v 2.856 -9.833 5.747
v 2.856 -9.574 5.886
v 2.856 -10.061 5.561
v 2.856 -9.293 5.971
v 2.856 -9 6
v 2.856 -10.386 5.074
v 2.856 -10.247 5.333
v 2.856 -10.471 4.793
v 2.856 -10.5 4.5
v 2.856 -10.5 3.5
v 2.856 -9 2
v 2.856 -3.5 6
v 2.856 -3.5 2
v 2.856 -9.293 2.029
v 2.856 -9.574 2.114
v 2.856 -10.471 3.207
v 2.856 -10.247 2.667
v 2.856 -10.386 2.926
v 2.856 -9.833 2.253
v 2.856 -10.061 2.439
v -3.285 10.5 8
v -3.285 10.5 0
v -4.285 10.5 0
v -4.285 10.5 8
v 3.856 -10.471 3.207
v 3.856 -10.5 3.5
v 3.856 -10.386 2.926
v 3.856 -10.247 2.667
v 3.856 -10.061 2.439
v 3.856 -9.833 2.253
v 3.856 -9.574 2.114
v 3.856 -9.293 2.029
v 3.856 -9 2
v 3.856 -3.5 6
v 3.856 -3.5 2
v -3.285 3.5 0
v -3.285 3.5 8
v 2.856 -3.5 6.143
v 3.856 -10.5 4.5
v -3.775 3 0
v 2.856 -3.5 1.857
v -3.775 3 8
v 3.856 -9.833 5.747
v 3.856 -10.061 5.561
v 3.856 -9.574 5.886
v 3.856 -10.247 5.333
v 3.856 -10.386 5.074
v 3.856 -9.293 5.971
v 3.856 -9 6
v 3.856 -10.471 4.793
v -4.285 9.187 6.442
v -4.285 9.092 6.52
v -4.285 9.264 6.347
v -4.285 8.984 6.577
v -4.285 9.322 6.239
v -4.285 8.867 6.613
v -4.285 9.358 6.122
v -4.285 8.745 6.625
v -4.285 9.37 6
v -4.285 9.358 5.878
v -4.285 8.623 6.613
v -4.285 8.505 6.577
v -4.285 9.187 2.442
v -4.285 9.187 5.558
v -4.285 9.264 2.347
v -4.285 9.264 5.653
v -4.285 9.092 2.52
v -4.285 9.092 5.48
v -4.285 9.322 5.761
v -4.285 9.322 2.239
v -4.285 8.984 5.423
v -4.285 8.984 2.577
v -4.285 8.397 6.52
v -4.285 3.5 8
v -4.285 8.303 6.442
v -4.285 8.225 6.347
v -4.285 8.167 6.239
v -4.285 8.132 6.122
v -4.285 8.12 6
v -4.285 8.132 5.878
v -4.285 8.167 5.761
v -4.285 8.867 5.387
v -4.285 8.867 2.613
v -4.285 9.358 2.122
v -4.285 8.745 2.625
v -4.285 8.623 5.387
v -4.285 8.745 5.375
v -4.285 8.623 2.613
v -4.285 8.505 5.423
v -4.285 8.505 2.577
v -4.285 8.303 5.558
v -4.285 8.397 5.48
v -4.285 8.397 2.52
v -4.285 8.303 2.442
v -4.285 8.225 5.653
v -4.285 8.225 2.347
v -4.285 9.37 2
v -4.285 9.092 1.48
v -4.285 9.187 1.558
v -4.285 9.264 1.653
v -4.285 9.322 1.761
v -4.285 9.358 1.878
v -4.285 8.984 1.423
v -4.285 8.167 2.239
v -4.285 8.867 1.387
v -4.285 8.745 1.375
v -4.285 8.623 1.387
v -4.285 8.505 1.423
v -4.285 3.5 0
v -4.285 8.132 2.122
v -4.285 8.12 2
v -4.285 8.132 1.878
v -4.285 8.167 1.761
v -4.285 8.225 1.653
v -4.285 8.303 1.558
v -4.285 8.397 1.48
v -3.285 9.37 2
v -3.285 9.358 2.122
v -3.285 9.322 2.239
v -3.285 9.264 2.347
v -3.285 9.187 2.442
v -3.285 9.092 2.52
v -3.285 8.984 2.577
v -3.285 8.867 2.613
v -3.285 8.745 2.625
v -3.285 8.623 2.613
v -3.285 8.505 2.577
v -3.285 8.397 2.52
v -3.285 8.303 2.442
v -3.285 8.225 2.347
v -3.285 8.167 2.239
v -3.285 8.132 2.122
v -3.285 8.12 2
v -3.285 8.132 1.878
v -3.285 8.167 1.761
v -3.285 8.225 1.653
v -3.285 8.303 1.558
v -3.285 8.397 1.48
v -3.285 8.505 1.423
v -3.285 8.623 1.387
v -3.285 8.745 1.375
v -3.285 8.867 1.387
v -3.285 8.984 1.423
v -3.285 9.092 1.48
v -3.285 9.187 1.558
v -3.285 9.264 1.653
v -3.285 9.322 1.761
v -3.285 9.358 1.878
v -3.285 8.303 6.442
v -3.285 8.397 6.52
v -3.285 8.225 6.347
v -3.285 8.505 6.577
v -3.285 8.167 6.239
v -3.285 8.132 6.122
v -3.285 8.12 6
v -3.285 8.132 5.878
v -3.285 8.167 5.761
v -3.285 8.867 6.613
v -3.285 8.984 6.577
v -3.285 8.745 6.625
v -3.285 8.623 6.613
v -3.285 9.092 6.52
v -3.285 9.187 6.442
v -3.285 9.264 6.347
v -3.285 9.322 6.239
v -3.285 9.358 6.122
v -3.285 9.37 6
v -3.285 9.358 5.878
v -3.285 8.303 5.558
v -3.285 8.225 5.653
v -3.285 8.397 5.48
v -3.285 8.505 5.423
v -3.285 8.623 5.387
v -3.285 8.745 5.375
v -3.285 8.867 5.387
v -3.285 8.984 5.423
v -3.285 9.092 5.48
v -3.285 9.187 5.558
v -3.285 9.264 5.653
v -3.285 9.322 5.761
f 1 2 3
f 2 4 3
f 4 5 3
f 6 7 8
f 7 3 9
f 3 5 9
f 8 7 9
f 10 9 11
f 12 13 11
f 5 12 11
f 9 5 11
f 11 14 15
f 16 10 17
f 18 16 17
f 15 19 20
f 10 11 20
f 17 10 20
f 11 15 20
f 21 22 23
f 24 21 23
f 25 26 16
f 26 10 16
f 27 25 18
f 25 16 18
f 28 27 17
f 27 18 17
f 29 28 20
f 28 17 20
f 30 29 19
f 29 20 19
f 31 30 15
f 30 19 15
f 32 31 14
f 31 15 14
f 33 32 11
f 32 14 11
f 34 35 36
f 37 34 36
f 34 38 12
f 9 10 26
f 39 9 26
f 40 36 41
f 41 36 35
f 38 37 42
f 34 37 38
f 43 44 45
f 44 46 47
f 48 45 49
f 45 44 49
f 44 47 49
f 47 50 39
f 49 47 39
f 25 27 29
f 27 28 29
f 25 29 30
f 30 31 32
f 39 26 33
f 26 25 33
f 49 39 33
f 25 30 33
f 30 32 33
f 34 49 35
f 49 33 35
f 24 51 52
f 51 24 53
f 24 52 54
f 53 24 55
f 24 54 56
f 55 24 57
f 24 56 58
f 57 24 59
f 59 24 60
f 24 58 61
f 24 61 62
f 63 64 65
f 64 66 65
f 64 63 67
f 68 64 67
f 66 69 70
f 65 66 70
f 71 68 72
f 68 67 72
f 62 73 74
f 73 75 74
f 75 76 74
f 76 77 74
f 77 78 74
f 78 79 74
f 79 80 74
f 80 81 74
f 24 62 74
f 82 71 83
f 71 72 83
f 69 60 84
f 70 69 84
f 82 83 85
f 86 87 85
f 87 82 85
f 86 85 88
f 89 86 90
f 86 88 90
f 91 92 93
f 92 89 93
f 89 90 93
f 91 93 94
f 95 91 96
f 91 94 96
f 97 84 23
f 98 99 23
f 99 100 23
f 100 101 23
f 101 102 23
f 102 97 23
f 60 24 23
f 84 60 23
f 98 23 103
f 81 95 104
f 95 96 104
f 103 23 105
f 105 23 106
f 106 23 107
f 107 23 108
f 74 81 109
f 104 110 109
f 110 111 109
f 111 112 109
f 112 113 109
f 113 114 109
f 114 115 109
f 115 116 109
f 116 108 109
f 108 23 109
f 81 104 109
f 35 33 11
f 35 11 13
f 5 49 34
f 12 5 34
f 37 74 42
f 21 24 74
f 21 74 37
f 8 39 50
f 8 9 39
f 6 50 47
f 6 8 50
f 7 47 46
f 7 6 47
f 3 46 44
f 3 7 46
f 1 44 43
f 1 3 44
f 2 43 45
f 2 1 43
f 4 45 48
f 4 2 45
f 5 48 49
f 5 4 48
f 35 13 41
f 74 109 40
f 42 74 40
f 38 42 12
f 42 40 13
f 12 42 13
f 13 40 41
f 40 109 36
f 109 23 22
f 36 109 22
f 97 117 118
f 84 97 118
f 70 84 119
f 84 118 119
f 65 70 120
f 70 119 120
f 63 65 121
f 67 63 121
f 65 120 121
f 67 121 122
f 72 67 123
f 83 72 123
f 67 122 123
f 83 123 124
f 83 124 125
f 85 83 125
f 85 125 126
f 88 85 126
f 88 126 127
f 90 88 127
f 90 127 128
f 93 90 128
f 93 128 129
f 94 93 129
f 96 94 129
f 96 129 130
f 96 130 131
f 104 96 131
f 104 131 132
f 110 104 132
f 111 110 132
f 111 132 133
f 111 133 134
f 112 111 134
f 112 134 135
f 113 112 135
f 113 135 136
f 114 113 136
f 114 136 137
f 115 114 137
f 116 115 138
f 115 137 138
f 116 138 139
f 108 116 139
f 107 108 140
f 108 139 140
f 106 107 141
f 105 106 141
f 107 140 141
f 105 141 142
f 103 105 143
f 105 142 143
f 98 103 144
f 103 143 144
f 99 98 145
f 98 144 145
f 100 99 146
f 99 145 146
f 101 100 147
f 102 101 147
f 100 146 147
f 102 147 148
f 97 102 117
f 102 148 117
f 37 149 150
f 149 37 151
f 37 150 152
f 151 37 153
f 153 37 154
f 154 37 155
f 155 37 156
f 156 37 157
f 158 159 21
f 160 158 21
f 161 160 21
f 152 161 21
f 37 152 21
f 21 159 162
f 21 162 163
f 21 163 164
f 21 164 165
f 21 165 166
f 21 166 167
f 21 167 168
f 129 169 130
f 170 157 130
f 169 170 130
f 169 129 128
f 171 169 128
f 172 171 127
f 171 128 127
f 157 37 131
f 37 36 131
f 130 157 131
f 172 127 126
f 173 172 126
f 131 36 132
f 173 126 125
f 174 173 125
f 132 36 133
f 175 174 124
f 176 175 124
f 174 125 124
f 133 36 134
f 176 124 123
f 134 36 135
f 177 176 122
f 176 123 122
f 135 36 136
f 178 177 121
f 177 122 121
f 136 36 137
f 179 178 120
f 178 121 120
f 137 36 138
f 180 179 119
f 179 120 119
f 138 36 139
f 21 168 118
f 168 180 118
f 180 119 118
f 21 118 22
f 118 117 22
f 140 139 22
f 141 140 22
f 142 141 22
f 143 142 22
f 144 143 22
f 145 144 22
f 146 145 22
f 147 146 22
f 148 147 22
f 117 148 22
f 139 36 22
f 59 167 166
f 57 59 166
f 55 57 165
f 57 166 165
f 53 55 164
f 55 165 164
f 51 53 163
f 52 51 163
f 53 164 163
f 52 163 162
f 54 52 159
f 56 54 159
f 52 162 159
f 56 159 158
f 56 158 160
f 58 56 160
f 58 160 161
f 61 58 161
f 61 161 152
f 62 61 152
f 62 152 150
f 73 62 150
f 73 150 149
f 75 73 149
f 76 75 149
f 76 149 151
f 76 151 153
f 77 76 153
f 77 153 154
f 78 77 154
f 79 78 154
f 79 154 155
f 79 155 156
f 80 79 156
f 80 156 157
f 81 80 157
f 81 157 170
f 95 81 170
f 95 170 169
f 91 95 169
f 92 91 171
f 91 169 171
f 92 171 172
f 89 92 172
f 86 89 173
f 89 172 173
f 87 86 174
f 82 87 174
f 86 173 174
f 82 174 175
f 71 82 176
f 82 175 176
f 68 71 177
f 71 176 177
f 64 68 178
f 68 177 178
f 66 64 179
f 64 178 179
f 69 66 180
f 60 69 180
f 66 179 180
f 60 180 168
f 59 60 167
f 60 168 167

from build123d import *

# Parameters (mm, degrees)
BOSS_EXTRU_1_DEPTH      = 8
ESQUISSE2_R             = 0.625
ENL_V_MAT_EXTRU_2_DEPTH = 8
ENL_V_MAT_EXTRU_4_DEPTH = 8
ESQUISSE4_W             = 2
ESQUISSE4_H             = 7
ENL_V_MAT_EXTRU_6_DEPTH = 8
CONG_4_R                = 1.5
CONG_7_R                = 1.5


with BuildPart() as part:
    # Esquisse1 → Boss.-Extru.1 (new body)
    with BuildSketch(Plane.XY):
        Polygon((-4.284999929, 10.5), (-4.284999929, 3.5), (2.8564285, -3.5), (2.8564285, -10.5), (3.8564285, -10.5), (3.8564285, -3.5), (-3.284999929, 3.5), (-3.284999929, 10.5), align=None)
    extrude(amount=BOSS_EXTRU_1_DEPTH)

    # Esquisse2 → Enlèv. mat.-Extru.2 (cut)
    with BuildSketch(Plane(origin=(-3.284999929, 0, 0), x_dir=(0, 0, -1), z_dir=(1, 0, 0))):
        with Locations(Location((-6, 8.744627622, 0), (0, 0, 90))):
            Circle(ESQUISSE2_R)
        with Locations(Location((-2, 8.744627622, 0), (0, 0, 90))):
            Circle(ESQUISSE2_R)
    extrude(amount=-ENL_V_MAT_EXTRU_2_DEPTH, mode=Mode.SUBTRACT)

    # Esquisse3 → Enlèv. mat.-Extru.4 (cut)
    with BuildSketch(Plane(origin=(0.14, 0.142828569, 0), x_dir=(0.7141428428542851, -0.7, 0), z_dir=(0.7, 0.7141428428542851, 0))):
        Polygon((-4.795959188, -8), (5.204040812, -6), (5.204040812, -8), align=None)
        Polygon((-4.795959188, 0), (5.204040812, -2), (5.204040812, 0), align=None)
    extrude(amount=-ENL_V_MAT_EXTRU_4_DEPTH, mode=Mode.SUBTRACT)

    # Esquisse4 → Enlèv. mat.-Extru.6 (cut)
    with BuildSketch(Plane(origin=(3.8564285, 0, 0), x_dir=(0, 0, -1), z_dir=(1, 0, 0))):
        with Locations((-7, -7)):
            Rectangle(ESQUISSE4_W, ESQUISSE4_H)
        with Locations((-1, -7)):
            Rectangle(ESQUISSE4_W, ESQUISSE4_H)
    extrude(amount=-ENL_V_MAT_EXTRU_6_DEPTH, mode=Mode.SUBTRACT)

    # Congé4
    cong_4_edges = [part.edges().sort_by_distance(p)[0] for p in [
        (3.3564285, -10.5, 2),
    ]]
    fillet(cong_4_edges, radius=CONG_4_R)

    # Congé7
    cong_7_edges = [part.edges().sort_by_distance(p)[0] for p in [
        (3.3564285, -10.5, 6),
    ]]
    fillet(cong_7_edges, radius=CONG_7_R)


solid = part.part
